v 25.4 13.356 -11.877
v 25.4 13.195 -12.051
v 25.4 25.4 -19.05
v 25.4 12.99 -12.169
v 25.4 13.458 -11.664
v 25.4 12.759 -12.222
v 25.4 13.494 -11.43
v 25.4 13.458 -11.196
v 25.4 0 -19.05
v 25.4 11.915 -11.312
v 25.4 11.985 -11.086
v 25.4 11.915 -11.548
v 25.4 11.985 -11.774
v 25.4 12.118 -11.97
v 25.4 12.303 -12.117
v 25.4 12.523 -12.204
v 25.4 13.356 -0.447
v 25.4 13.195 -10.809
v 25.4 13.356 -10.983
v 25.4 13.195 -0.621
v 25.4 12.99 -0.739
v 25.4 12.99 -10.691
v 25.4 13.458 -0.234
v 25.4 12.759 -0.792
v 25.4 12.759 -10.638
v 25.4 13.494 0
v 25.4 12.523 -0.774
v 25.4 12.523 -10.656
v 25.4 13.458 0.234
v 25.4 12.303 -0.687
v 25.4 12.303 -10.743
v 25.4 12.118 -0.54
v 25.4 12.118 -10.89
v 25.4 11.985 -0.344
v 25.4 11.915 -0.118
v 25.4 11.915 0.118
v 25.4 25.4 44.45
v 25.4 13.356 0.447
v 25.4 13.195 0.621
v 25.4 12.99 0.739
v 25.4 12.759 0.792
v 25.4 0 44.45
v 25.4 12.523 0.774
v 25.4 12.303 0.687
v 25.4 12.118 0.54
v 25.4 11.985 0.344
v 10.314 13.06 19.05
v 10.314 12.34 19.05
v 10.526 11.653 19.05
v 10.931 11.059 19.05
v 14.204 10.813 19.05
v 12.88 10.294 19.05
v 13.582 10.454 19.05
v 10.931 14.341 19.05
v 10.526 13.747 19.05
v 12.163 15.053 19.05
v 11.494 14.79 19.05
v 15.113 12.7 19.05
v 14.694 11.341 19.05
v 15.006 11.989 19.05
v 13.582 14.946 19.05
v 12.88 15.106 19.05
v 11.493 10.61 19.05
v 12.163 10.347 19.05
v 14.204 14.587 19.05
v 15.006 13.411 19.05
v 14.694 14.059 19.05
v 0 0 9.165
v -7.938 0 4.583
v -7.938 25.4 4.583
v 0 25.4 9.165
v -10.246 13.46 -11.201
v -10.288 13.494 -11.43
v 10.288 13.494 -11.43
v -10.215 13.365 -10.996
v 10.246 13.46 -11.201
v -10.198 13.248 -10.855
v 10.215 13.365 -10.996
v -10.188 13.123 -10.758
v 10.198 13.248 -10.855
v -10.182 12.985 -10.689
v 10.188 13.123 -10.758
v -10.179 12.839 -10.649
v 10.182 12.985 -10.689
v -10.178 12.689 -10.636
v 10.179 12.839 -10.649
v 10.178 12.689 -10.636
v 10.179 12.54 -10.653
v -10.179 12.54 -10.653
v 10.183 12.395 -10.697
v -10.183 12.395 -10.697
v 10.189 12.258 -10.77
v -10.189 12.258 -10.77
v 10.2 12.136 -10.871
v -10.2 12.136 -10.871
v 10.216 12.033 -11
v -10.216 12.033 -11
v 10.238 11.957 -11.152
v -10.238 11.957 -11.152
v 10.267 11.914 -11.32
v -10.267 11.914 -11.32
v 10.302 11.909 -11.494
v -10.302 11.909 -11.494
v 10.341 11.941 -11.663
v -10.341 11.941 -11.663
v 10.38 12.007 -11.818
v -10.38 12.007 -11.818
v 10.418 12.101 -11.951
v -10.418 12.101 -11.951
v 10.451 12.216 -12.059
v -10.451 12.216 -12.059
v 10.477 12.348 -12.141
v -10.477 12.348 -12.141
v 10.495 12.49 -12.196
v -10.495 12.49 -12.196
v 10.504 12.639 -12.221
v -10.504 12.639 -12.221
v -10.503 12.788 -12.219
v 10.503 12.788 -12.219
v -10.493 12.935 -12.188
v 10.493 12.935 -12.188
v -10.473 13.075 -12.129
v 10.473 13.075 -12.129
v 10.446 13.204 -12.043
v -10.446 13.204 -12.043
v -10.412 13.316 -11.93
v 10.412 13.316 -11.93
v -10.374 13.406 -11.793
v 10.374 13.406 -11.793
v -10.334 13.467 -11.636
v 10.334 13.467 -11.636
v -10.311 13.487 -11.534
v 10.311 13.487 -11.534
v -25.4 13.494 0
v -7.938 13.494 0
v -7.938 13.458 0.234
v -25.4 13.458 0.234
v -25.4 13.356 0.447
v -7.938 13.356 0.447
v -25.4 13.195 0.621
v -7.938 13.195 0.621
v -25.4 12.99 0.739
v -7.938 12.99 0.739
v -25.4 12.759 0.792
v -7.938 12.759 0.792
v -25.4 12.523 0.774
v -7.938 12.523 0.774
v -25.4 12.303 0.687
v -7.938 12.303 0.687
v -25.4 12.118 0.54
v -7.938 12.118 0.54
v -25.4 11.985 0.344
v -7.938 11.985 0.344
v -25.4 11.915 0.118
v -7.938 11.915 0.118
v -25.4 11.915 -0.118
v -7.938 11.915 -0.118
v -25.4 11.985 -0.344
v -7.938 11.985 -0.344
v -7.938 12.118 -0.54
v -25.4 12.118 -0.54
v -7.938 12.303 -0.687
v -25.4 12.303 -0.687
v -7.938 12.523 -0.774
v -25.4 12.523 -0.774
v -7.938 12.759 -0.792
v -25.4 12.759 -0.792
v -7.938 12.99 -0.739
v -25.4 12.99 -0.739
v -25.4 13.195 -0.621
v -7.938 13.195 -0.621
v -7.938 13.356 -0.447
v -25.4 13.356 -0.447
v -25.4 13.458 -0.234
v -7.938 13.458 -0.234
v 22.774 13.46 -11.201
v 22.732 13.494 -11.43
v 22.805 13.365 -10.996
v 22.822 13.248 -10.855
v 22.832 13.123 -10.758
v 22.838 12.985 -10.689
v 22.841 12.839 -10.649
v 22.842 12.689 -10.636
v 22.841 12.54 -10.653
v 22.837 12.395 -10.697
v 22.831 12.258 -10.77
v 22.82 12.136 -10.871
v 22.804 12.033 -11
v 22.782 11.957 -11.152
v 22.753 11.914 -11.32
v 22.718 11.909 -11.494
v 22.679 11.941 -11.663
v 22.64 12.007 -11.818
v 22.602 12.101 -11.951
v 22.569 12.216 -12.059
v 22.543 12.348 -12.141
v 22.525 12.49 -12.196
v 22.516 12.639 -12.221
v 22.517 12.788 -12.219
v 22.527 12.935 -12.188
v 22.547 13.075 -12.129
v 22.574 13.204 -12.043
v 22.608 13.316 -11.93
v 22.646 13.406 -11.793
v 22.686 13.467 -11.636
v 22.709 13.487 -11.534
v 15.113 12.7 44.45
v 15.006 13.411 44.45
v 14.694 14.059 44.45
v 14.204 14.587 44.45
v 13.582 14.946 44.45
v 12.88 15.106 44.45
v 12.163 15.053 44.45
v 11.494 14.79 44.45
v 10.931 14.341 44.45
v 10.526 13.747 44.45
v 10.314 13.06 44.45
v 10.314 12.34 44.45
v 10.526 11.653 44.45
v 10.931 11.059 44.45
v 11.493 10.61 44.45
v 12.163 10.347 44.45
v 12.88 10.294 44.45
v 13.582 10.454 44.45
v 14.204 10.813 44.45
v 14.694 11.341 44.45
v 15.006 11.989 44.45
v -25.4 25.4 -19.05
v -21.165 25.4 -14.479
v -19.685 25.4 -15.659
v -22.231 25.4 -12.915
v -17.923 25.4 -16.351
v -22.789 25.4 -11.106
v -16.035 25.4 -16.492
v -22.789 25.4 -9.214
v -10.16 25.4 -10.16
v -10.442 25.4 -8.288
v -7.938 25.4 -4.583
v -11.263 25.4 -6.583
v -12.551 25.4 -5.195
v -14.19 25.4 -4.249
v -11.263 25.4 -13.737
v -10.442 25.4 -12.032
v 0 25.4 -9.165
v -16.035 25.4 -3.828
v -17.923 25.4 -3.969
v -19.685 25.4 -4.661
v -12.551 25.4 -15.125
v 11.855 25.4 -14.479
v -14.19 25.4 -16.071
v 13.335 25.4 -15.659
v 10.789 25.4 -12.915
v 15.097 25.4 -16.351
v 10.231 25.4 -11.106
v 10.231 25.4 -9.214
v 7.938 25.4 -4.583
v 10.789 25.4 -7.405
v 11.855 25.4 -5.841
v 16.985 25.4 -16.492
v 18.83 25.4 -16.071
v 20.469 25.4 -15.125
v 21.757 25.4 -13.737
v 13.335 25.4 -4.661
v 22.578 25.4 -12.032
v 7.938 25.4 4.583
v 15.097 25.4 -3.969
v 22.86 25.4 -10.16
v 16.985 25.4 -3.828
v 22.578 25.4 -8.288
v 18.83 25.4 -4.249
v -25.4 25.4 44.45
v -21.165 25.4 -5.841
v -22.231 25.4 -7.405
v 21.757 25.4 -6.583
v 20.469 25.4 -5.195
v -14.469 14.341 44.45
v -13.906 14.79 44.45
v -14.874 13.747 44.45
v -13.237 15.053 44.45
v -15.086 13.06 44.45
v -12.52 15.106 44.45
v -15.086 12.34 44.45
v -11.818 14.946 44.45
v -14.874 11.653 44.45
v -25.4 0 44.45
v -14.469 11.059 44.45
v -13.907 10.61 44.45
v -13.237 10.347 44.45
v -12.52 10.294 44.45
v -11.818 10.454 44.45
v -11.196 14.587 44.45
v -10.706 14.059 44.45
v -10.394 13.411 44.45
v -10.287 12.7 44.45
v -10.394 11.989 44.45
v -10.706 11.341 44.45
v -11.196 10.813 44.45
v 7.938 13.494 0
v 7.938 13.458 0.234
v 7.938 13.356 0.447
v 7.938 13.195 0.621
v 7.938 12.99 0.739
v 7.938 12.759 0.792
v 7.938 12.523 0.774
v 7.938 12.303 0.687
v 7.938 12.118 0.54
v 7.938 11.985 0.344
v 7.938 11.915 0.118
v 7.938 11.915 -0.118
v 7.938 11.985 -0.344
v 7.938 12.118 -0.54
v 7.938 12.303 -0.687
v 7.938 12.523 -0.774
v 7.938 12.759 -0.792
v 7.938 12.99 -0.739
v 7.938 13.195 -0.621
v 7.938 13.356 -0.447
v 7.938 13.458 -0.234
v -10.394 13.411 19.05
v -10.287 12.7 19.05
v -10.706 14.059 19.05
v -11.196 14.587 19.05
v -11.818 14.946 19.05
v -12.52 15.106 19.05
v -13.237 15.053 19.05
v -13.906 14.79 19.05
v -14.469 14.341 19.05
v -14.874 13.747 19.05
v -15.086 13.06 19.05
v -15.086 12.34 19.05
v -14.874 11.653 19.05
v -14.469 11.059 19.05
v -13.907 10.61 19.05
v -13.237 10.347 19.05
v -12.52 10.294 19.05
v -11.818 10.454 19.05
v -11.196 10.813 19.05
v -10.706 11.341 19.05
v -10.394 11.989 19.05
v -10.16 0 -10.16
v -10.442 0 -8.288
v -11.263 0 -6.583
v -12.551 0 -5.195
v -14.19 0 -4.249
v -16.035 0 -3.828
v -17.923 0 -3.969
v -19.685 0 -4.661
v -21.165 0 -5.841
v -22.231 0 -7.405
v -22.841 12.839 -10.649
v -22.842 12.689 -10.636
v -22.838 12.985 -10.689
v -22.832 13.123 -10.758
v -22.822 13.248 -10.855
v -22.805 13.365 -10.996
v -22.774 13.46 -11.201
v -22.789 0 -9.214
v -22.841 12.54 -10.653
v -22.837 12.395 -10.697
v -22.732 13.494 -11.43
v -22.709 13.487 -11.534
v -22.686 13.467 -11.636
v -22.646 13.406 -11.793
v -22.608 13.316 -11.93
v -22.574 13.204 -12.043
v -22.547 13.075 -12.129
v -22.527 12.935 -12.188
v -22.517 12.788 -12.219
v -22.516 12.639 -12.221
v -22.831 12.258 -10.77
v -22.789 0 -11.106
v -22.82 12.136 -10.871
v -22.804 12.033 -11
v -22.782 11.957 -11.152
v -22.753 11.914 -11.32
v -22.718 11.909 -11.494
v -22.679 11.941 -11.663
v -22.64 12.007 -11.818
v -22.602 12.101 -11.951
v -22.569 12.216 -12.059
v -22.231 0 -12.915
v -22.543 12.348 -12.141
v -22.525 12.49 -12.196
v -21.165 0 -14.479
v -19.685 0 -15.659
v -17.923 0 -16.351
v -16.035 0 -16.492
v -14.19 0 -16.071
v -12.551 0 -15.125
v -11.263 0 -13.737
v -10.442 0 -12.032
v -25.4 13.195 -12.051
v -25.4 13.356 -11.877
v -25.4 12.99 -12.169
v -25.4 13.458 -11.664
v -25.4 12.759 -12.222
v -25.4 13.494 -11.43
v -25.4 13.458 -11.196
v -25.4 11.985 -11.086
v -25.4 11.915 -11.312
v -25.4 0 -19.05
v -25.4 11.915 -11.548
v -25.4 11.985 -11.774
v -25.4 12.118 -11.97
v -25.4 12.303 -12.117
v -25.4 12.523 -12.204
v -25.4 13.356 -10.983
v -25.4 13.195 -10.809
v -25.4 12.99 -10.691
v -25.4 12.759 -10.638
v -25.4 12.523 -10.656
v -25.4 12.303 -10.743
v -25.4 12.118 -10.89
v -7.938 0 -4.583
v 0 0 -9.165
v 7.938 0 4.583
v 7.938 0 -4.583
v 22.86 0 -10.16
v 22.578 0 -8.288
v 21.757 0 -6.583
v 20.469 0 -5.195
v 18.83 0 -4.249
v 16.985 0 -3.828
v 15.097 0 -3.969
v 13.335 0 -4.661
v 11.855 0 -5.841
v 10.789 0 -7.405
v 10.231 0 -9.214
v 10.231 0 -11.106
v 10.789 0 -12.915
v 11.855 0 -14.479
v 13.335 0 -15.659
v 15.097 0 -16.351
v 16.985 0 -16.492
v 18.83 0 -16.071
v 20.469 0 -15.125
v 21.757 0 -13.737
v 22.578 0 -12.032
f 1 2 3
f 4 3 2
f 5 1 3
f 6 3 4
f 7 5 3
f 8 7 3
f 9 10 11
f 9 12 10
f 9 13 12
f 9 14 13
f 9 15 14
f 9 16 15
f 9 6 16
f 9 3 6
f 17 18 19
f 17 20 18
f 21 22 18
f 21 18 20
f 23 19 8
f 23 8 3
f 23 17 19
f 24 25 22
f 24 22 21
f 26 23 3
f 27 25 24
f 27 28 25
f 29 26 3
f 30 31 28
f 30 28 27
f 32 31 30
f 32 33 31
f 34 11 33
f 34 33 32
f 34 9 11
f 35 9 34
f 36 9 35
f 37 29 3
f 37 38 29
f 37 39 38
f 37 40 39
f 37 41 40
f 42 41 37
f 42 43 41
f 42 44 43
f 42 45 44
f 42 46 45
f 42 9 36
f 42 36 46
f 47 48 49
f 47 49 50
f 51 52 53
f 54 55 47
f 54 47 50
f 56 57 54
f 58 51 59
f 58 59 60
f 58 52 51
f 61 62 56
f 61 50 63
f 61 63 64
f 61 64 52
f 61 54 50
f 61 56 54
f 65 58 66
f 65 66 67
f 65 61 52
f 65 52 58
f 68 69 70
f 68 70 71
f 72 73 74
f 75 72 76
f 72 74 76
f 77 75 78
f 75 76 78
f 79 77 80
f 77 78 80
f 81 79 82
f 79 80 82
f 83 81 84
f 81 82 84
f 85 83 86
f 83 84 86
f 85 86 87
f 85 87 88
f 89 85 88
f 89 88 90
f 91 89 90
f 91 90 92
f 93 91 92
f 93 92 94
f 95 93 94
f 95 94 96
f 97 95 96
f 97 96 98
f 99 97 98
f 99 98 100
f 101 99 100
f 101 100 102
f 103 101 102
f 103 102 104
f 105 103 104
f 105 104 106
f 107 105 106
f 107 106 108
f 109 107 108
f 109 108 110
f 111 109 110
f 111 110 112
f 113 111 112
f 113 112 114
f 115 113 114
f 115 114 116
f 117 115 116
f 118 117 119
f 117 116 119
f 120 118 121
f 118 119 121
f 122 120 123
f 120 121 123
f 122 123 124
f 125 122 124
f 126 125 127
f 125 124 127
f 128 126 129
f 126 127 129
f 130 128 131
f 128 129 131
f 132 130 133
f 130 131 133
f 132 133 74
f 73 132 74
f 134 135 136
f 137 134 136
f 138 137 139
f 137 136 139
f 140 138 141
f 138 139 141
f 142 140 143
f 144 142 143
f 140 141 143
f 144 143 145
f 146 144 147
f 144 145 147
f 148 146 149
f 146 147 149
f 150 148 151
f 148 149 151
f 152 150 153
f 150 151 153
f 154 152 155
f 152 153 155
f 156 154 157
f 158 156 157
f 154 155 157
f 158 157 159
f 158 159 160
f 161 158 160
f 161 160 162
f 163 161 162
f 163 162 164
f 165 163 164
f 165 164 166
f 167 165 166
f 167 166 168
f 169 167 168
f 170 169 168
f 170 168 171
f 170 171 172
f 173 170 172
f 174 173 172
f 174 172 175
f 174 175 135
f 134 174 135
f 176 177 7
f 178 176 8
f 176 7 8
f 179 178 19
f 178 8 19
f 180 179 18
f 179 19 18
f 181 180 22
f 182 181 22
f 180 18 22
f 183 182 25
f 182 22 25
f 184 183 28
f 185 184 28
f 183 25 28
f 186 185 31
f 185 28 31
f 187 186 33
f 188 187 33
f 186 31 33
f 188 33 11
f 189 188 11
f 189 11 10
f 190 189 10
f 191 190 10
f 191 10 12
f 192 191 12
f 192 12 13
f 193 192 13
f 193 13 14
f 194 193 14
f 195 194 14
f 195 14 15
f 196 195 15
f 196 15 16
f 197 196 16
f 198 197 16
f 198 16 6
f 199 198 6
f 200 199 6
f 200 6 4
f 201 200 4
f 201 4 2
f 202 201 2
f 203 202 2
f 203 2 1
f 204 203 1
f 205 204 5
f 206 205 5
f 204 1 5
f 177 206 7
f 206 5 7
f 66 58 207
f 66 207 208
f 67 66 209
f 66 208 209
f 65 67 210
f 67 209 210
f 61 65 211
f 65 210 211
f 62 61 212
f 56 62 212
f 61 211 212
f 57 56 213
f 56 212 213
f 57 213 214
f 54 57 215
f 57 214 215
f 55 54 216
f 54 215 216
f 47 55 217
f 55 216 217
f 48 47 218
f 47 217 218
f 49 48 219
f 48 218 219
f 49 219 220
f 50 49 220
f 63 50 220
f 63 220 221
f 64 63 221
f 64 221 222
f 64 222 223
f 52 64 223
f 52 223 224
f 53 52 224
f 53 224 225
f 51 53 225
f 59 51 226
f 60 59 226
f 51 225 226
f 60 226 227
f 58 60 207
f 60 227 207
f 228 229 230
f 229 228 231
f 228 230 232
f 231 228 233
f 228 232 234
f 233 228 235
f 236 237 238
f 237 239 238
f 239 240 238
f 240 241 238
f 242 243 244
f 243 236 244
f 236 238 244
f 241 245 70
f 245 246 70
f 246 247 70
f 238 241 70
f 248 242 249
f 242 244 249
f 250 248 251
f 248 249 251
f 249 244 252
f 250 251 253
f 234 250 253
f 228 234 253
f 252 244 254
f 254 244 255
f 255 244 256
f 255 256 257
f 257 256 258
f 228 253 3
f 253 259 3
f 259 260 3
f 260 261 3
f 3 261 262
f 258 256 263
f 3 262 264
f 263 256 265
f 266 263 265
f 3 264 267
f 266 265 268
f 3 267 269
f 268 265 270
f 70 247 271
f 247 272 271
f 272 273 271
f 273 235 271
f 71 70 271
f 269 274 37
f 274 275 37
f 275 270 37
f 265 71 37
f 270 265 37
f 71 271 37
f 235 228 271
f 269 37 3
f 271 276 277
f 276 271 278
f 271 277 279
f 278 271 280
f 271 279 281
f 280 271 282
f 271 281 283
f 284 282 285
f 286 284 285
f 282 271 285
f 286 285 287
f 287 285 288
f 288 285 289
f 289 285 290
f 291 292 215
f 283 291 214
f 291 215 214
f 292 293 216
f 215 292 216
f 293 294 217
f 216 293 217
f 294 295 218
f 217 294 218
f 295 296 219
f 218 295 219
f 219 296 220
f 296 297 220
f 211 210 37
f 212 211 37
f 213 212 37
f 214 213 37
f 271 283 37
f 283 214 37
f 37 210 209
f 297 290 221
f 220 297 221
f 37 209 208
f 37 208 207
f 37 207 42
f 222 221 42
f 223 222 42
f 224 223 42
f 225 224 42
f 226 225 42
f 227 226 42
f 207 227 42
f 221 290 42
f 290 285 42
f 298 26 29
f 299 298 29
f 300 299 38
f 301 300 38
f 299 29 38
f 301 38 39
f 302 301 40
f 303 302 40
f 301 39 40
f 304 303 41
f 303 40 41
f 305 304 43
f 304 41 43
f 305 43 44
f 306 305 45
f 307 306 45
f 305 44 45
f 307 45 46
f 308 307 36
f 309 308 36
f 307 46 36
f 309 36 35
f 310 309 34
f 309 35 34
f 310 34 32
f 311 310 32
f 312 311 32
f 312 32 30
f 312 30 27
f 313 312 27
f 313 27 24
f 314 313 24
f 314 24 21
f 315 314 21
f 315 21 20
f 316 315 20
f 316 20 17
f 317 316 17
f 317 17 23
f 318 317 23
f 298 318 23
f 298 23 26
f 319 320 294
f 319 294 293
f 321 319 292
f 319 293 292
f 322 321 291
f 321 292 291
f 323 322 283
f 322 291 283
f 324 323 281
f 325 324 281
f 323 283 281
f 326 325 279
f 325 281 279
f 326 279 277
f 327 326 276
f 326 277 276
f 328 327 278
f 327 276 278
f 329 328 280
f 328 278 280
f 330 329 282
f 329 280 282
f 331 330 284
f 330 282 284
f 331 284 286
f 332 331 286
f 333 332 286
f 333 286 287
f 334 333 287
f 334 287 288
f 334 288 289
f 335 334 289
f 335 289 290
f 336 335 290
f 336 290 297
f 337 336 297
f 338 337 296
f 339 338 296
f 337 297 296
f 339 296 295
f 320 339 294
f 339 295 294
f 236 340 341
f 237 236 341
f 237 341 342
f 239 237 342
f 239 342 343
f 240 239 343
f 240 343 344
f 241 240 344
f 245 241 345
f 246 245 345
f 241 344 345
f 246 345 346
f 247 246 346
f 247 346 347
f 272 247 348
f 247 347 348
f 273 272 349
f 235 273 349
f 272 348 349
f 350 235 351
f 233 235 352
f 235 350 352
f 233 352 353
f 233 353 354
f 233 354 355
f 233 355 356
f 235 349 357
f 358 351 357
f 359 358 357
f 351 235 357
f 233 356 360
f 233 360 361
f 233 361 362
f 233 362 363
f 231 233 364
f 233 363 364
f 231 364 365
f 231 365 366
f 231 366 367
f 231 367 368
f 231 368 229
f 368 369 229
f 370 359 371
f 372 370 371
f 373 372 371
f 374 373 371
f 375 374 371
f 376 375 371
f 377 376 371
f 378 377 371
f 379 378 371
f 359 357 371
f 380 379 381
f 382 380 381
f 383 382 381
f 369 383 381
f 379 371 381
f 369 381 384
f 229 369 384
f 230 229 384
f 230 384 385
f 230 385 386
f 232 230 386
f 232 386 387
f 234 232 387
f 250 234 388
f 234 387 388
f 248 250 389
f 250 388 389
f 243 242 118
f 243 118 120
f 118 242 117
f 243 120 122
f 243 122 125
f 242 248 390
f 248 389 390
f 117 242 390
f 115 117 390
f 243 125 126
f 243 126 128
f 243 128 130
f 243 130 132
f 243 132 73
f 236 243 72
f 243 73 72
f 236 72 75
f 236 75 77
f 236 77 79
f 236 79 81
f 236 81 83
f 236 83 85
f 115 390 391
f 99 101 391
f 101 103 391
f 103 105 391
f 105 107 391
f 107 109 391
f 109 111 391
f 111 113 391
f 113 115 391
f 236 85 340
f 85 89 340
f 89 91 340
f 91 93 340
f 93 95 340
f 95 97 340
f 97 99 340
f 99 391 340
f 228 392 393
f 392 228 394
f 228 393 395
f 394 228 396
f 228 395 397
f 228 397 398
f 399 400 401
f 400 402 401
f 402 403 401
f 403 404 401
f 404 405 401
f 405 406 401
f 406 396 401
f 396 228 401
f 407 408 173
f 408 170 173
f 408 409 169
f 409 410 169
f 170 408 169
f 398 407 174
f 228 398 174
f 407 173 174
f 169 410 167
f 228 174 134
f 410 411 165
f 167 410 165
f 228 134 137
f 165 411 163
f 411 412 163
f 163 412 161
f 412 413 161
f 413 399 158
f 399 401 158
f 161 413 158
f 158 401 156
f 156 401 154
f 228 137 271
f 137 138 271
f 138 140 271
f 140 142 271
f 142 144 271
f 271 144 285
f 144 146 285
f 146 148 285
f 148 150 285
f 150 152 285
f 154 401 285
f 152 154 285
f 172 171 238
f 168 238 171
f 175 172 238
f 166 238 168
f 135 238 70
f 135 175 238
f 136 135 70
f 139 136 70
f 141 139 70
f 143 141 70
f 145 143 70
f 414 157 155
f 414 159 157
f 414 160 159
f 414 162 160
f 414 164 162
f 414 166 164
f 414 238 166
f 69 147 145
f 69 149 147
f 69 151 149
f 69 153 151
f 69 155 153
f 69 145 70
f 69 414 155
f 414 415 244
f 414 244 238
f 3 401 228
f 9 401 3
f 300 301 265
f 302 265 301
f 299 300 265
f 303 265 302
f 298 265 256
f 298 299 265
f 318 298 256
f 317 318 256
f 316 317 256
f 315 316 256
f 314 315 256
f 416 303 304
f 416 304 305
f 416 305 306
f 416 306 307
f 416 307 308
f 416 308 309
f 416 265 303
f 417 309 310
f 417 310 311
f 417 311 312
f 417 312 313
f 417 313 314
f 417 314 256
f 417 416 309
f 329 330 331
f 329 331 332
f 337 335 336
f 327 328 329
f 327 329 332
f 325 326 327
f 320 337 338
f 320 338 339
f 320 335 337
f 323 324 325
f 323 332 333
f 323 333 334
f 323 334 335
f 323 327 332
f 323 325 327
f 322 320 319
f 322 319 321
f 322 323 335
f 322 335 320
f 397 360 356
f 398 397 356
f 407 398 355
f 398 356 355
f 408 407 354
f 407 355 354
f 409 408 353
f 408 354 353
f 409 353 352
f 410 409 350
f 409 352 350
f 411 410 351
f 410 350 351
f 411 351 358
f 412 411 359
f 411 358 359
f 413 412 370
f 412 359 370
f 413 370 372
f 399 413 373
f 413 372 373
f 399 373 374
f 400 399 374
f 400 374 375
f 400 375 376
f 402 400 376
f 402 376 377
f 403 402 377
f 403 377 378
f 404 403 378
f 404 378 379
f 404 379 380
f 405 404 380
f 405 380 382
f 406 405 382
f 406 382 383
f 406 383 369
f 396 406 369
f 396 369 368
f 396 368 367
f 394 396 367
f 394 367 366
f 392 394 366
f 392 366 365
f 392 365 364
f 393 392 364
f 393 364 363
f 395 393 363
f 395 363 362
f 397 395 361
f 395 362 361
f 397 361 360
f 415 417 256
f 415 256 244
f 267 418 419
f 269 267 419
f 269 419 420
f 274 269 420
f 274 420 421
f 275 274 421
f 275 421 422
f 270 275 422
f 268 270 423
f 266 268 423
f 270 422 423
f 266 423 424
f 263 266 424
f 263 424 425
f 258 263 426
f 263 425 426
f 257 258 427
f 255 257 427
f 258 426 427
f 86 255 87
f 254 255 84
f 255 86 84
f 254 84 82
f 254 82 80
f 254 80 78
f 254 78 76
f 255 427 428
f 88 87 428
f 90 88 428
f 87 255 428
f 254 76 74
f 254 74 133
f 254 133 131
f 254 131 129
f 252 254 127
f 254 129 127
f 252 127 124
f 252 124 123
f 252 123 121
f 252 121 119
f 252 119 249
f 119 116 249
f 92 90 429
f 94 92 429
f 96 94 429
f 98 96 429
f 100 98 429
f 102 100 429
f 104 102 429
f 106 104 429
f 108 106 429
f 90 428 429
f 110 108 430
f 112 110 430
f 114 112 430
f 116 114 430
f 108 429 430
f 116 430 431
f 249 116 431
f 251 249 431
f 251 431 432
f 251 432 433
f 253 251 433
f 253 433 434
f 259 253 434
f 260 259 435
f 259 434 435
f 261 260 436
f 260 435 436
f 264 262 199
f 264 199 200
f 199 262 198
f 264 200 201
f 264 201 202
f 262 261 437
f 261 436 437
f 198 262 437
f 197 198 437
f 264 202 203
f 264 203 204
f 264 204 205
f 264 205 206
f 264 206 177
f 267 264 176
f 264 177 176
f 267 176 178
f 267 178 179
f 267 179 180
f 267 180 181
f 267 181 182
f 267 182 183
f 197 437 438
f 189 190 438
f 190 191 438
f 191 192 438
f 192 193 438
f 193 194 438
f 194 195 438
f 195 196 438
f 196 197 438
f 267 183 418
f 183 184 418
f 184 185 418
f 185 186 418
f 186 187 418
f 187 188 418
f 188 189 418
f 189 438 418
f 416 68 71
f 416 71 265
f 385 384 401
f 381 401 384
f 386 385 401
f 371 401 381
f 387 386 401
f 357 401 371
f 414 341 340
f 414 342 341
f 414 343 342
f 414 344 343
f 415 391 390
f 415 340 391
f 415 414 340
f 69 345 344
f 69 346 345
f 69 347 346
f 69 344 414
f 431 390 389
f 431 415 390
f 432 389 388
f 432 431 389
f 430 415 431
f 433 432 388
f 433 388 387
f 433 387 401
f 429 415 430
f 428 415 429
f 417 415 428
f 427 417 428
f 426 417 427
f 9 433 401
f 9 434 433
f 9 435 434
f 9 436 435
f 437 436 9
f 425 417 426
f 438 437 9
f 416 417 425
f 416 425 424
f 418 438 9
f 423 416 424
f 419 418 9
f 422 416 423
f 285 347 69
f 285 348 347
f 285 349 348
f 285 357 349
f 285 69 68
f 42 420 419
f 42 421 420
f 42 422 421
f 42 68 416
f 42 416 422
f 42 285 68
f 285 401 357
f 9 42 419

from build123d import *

# Parameters (mm, degrees)
F0_W     = 50.8
F0_H     = 63.5
F0_R     = 6.35
F1_DEPTH = 25.4
F2_R     = 0.79375
F3_DEPTH = 50.801
F4_R     = 2.413
F5_DEPTH = 25.4


with BuildPart() as f1:
    # F0 (on Front) → F1 (new body)
    with BuildSketch(Plane.XZ):
        with Locations((0, 12.7)):
            Rectangle(F0_W, F0_H)
        with Locations((-16.51, -10.16)):
            Circle(F0_R, mode=Mode.SUBTRACT)
        Polygon((0, -9.165436), (-7.9375, -4.582718), (-7.9375, 4.582718), (0, 9.165436), (7.9375, 4.582718), (7.9375, -4.582718), align=None, mode=Mode.SUBTRACT)
        with Locations((16.51, -10.16)):
            Circle(F0_R, mode=Mode.SUBTRACT)
    extrude(amount=-F1_DEPTH)

    # F2 (on face) → F3 (cut, through all)
    with BuildSketch(Plane.YZ.offset(25.4)):
        with Locations((12.7, -11.43)):
            Circle(F2_R)
        with Locations((12.7, 0)):
            Circle(F2_R)
    extrude(amount=-F3_DEPTH, mode=Mode.SUBTRACT)

    # F4 (on face) → F5 (cut)
    with BuildSketch(Plane.XY.offset(44.45)):
        with Locations((12.7, 12.7)):
            Circle(F4_R)
        with Locations((-12.7, 12.7)):
            Circle(F4_R)
    extrude(amount=-F5_DEPTH, mode=Mode.SUBTRACT)


solid = f1.part
